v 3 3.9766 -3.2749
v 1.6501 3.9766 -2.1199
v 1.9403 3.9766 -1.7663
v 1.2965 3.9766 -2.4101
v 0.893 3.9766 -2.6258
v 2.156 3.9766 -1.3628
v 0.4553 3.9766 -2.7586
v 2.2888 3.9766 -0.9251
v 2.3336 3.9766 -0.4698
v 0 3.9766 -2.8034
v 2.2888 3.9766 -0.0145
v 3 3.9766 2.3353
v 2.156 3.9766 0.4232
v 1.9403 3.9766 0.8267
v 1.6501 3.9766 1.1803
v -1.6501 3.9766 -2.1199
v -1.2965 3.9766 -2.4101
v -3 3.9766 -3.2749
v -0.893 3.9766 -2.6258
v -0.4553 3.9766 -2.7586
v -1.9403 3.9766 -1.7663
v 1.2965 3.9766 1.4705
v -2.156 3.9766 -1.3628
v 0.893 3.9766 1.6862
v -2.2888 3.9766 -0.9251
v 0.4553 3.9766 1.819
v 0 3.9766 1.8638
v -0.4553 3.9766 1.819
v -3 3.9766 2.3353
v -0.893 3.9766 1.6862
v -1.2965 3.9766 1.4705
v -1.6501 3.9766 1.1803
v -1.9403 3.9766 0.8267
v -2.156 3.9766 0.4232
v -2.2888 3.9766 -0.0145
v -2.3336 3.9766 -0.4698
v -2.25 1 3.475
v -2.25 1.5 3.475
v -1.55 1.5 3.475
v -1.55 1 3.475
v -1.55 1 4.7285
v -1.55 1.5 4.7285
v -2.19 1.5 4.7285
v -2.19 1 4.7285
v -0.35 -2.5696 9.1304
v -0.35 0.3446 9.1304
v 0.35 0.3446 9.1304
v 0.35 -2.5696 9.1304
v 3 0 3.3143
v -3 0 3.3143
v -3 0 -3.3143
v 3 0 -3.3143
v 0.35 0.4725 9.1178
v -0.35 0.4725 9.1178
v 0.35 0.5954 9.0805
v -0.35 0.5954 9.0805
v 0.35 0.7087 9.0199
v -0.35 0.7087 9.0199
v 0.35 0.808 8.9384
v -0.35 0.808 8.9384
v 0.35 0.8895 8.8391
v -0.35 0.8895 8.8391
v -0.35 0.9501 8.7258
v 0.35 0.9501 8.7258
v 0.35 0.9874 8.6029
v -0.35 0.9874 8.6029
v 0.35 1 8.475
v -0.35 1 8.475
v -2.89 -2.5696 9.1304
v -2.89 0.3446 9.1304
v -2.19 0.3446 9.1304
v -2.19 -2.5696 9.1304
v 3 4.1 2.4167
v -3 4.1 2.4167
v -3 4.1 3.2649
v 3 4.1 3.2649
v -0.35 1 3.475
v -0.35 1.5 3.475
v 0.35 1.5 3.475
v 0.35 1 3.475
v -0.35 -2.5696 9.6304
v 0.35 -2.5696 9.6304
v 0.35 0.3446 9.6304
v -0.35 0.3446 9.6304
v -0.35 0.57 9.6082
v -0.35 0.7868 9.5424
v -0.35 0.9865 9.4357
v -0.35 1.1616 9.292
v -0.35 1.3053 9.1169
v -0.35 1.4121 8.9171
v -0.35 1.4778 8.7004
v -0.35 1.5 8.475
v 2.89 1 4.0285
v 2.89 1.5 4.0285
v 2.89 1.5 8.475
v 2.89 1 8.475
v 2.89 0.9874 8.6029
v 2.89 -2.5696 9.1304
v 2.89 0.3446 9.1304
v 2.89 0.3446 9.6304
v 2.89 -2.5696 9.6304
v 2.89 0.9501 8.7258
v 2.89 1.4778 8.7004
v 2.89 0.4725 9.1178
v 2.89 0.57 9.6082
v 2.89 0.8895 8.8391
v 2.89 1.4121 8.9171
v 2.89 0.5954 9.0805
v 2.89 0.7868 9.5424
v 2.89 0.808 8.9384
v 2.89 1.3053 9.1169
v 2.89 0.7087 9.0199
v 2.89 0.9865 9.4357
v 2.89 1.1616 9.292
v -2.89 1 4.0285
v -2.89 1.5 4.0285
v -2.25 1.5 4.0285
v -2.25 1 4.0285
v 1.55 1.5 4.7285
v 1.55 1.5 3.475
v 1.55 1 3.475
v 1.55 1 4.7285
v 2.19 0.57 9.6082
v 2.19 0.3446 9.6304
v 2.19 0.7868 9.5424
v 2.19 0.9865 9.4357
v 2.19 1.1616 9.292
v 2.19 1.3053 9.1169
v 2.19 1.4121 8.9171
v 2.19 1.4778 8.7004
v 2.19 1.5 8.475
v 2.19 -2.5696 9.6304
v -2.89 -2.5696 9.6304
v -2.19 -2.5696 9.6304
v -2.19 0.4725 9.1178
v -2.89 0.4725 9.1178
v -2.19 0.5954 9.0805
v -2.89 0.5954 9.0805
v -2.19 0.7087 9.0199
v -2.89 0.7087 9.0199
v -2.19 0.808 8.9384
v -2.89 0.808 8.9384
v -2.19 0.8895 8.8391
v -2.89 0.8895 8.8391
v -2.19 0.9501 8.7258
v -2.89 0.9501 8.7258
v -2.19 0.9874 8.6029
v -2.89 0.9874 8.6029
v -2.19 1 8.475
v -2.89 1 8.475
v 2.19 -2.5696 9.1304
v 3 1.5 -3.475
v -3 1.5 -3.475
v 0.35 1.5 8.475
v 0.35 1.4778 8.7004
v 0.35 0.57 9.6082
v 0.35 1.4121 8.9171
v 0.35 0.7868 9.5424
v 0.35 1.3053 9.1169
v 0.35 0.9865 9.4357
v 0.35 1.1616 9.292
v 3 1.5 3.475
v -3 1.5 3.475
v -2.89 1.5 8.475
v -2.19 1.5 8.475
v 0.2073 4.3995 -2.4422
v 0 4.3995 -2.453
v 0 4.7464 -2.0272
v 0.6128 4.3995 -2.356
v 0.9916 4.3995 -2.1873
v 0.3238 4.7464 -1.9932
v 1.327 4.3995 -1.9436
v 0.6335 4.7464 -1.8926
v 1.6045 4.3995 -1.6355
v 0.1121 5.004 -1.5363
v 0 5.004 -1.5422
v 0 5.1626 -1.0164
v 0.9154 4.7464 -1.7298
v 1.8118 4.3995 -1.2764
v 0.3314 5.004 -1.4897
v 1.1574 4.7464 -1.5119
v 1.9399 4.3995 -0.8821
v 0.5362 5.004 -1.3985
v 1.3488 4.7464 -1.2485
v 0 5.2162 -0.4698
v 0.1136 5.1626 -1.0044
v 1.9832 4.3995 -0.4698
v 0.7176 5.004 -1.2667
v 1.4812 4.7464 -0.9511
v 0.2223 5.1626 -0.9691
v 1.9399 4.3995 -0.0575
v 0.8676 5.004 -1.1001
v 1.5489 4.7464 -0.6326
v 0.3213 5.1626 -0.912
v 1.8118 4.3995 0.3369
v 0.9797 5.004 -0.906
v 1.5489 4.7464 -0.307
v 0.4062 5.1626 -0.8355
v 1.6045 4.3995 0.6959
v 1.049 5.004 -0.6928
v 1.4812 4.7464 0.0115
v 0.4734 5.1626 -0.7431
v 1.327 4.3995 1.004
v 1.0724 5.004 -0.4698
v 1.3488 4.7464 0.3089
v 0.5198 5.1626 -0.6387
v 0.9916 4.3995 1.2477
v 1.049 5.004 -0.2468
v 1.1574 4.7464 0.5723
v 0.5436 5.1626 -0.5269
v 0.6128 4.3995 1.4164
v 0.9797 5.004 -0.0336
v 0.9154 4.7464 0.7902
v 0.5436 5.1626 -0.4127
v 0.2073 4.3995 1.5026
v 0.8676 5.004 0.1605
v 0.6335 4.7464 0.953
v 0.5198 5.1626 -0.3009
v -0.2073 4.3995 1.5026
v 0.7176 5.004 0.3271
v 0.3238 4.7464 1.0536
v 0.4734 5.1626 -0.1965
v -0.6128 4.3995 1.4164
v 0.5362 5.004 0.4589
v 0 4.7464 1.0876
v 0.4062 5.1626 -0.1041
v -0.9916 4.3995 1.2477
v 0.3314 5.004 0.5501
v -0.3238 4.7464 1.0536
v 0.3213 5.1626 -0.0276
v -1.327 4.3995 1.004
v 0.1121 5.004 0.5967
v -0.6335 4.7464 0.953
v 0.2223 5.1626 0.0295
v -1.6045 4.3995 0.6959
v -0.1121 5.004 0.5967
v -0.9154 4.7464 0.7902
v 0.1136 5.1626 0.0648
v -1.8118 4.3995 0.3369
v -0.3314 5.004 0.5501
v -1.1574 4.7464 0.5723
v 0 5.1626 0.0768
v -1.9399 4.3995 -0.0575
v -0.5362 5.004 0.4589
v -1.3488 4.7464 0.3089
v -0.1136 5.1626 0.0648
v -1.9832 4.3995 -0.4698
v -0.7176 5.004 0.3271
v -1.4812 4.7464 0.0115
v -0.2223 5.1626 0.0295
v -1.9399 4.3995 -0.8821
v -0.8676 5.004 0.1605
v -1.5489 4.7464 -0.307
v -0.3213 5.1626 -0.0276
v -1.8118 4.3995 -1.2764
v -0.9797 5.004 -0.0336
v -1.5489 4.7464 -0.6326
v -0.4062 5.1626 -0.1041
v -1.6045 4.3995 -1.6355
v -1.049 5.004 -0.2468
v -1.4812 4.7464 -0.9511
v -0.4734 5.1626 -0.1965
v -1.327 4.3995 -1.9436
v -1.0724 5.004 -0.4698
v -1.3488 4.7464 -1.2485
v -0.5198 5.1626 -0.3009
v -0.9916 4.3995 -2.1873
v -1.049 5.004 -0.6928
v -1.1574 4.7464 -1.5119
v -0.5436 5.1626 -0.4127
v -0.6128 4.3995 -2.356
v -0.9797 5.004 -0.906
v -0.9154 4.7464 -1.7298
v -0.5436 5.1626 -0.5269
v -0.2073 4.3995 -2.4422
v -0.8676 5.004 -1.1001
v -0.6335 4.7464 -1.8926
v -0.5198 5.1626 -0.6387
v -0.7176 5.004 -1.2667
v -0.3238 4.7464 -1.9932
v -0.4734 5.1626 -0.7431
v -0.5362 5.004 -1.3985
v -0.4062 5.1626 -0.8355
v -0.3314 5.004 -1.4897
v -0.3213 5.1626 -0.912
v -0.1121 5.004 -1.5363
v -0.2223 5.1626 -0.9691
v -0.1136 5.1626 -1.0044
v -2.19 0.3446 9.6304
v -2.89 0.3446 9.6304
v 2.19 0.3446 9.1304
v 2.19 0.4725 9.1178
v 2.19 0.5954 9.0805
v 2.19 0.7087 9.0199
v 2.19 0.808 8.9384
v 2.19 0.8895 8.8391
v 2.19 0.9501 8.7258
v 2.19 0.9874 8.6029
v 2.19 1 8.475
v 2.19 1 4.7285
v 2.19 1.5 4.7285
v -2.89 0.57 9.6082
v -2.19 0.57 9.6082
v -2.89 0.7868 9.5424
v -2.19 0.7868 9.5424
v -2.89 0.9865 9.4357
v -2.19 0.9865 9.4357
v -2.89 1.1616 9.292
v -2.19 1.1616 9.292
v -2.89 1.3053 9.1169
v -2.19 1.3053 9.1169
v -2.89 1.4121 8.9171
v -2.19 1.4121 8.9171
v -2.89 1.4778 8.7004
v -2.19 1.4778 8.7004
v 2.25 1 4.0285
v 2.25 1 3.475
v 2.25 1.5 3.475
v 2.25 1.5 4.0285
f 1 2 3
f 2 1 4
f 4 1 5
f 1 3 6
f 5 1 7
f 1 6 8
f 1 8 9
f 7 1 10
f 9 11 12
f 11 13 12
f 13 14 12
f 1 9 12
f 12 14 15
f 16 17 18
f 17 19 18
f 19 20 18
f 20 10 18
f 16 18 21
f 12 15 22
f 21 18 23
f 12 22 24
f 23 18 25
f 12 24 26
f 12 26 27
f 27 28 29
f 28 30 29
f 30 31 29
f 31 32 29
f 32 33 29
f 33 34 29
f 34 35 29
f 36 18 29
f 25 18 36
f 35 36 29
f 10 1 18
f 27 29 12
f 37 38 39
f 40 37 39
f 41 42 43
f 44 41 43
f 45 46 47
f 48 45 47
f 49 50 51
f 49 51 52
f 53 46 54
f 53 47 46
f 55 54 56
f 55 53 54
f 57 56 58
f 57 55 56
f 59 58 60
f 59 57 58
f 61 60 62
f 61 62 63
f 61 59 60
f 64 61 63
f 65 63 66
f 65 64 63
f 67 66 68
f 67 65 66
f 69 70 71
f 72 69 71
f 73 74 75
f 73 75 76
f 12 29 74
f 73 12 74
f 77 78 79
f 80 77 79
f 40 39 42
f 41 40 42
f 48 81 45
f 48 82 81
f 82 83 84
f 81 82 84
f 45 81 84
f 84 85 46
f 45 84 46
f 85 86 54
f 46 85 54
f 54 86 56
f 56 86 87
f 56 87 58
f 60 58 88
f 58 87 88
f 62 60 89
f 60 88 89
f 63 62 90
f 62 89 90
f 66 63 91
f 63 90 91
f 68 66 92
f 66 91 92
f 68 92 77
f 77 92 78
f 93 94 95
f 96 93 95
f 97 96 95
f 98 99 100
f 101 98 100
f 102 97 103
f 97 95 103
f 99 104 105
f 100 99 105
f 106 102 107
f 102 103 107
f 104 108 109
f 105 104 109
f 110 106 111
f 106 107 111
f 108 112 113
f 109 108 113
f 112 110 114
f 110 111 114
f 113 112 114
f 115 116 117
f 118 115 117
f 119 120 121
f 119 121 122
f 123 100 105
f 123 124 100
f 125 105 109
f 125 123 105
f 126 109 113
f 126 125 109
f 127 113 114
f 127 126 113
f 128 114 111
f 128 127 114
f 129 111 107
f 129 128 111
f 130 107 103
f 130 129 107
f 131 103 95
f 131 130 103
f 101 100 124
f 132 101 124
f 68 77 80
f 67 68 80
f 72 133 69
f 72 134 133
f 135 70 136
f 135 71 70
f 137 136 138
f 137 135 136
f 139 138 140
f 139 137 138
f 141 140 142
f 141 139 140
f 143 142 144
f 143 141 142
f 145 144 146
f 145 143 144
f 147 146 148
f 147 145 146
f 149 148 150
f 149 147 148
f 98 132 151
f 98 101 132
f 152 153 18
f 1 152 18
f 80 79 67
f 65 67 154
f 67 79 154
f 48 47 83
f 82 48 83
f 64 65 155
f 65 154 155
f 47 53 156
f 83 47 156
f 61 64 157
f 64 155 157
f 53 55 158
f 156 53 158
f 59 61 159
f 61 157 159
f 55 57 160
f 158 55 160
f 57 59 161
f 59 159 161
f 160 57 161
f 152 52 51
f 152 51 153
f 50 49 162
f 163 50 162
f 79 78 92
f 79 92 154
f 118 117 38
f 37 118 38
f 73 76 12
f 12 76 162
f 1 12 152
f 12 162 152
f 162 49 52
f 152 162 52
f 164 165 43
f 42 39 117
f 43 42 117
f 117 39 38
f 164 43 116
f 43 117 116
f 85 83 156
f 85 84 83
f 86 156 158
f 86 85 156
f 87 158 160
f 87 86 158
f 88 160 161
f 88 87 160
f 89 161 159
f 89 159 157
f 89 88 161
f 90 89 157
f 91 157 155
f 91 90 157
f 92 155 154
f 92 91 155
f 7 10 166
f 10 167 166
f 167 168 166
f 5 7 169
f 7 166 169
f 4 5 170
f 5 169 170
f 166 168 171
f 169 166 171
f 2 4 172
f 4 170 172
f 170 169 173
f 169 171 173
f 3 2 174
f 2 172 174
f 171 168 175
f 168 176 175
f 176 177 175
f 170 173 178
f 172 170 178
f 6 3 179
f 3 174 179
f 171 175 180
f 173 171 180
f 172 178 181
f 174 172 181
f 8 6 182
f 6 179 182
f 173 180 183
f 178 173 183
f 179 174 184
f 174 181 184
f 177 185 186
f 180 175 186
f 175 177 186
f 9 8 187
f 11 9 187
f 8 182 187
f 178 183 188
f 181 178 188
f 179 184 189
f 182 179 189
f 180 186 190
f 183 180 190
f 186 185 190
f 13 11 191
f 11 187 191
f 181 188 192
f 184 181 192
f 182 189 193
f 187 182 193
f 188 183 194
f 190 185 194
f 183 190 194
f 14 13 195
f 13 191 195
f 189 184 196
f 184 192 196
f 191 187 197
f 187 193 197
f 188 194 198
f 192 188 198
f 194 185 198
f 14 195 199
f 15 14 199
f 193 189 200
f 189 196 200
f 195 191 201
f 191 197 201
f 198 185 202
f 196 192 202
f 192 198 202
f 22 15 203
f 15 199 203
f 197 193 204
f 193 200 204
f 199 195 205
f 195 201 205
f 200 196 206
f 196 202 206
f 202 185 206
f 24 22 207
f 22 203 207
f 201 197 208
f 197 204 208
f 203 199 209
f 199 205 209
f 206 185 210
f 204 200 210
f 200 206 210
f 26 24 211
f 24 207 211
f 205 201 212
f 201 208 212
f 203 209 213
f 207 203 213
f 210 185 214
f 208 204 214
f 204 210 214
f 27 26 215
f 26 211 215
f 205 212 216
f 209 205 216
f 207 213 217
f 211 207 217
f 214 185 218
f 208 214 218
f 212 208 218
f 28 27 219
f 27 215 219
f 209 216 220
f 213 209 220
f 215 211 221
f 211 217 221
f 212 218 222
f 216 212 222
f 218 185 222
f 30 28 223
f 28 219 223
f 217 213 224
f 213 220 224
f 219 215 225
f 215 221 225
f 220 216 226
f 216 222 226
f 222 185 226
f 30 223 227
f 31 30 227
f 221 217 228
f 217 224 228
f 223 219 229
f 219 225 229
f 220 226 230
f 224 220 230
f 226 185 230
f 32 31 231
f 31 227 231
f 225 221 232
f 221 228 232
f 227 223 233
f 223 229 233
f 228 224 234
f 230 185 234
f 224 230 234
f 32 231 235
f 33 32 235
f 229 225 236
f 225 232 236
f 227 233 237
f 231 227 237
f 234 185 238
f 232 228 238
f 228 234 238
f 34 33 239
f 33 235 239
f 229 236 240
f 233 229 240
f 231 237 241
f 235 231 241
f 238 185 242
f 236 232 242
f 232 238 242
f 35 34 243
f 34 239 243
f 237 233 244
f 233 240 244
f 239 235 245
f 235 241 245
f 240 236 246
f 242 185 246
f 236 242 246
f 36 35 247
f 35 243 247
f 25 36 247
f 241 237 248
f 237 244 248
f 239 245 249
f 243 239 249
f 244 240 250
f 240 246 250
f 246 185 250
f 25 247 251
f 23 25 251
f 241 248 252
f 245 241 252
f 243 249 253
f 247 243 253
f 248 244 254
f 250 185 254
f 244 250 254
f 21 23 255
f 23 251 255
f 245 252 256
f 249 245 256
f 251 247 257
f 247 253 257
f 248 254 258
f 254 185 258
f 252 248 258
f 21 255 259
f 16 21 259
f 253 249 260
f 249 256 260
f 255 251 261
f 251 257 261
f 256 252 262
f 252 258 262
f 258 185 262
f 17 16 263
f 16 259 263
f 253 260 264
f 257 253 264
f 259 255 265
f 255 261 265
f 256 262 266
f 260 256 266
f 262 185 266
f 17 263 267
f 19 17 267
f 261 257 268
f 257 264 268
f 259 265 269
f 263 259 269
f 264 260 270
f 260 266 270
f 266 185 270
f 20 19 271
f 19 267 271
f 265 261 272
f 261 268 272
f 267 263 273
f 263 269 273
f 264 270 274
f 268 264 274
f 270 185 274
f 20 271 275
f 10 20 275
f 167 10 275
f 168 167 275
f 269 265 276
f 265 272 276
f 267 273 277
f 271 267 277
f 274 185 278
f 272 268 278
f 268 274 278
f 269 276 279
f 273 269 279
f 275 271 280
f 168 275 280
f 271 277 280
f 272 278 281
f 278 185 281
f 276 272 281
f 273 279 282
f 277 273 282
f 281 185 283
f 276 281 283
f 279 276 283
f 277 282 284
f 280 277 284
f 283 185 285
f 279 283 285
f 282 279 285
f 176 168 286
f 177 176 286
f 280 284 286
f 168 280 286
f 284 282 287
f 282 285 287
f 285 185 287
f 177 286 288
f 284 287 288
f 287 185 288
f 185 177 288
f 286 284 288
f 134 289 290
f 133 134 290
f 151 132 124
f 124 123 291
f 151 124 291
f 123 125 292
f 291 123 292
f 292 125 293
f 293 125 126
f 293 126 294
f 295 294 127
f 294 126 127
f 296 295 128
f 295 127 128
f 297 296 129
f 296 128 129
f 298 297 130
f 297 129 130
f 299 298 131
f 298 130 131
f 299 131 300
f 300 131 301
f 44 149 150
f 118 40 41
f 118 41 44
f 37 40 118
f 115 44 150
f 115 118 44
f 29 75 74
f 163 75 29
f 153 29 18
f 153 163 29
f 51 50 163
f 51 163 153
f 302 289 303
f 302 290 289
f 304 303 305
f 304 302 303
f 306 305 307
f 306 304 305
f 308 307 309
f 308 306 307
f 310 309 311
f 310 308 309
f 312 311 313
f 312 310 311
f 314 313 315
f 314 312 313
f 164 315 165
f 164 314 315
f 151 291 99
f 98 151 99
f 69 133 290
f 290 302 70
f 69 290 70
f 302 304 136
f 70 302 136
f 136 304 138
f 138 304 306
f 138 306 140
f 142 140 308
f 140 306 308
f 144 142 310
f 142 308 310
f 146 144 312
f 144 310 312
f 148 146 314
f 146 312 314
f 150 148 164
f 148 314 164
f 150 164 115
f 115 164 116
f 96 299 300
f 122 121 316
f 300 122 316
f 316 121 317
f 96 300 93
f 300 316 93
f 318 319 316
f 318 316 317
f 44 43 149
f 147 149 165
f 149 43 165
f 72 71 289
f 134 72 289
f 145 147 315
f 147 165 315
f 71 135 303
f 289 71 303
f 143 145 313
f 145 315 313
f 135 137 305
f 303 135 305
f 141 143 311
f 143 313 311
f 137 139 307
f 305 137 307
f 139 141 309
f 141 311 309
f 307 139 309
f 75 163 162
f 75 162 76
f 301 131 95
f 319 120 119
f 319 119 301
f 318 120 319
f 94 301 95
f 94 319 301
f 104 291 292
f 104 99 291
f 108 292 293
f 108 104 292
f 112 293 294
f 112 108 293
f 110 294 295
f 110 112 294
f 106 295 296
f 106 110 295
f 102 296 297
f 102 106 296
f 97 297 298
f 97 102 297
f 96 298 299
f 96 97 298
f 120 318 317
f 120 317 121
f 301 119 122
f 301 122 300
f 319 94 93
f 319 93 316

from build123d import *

# Parameters (mm, degrees)
SKETCH1_W             = 6
SKETCH1_H             = 6.95
BOSS_EXTRUDE1_DEPTH   = 4.1
CUT_EXTRUDE2_DEPTH    = 10
SKETCH6_W             = 0.7
SKETCH6_H             = 5
BOSS_EXTRUDE2_DEPTH   = 0.5
BOSS_EXTRUDE2_2_DEPTH = 0.5
BOSS_EXTRUDE2_3_DEPTH = 0.5
SKETCH8_W             = 0.7
SKETCH8_H             = 0.5
LPATTERN1_COUNT       = 2
LPATTERN1_PITCH       = 2.54
LPATTERN2_COUNT       = 2
LPATTERN2_PITCH       = 2.54


with BuildPart() as part:
    # Sketch1 → Boss-Extrude1 (new body)
    with BuildSketch(Plane(origin=(0, 0, 0), x_dir=(1, 0, 0), z_dir=(0, 1, 0))):
        Rectangle(SKETCH1_W, SKETCH1_H)
    extrude(amount=BOSS_EXTRUDE1_DEPTH)

    # Sketch2 → Cut-Extrude2 (cut)
    with BuildSketch(Plane.ZY.offset(3)):
        Polygon((-3.475, 1.5), (-3.274875222, 3.976607761), (2.335282133, 3.976607761), (2.548204916, 4.299426173), (-3.248789555, 4.299426173), (-4.086743732, 4.299426173), (-4.086743732, -0.611534783), (-3.248789555, -0.611534783), align=None)
        Polygon((3.248789555, -0.611534783), (3.475, 1.5), (3.248789555, 4.299426173), (4.086743732, 4.299426173), (4.086743732, -0.611534783), align=None)
    extrude(amount=-CUT_EXTRUDE2_DEPTH, mode=Mode.SUBTRACT)

    # Sketch5 → Revolve2 (revolve)
    with BuildSketch(Plane(origin=(0, 0, 0), x_dir=(0, 0, -1), z_dir=(1, 0, 0))):
        with BuildLine():
            Line((0.469796544, 5.21616514), (0.469796544, 3.976607761))
            Line((0.469796544, 3.976607761), (2.803412544, 3.976607761))
            ThreePointArc((2.803412544, 3.976607761), (1.790995444, 4.887045907), (0.469796544, 5.21616514))
        make_face()
    revolve(axis=Axis((0, 3.976607761, -0.469796544), (0, -1, 0)))


with BuildPart() as body_2:
    # Sketch6 → Boss-Extrude2 (new body)
    with BuildSketch(Plane(origin=(0, 1.5, 0), x_dir=(1, 0, 0), z_dir=(0, 1, 0))):
        with Locations((0, -5.975)):
            Rectangle(SKETCH6_W, SKETCH6_H)
    extrude(amount=-BOSS_EXTRUDE2_DEPTH)

    # Sweep1: sweep along a path in Sketch7
    with BuildLine(Plane(origin=(0, 0, 0), x_dir=(0, 0, -1), z_dir=(1, 0, 0))) as sweep1_path:
        Line((-9.380387544, -2.569590895), (-9.380387544, 0.344612456))
        ThreePointArc((-9.380387544, 0.344612456), (-9.115205672, 0.984818128), (-8.475, 1.25))
    # Sketch8 → Sweep1 (sweep)
    with BuildSketch(Plane.XY.offset(8.475)):
        with Locations((0, 1.25)):
            Rectangle(SKETCH8_W, SKETCH8_H)
    sweep1 = sweep(path=sweep1_path.line)


with BuildPart() as body_3:
    # Sketch6 → Boss-Extrude2 2 (new body)
    with BuildSketch(Plane(origin=(0, 1.5, 0), x_dir=(1, 0, 0), z_dir=(0, 1, 0))):
        Polygon((-1.55, -3.475), (-1.55, -4.72854454), (-2.19, -4.72854454), (-2.19, -8.475), (-2.89, -8.475), (-2.89, -4.02854454), (-2.25, -4.02854454), (-2.25, -3.475), align=None)
    extrude(amount=-BOSS_EXTRUDE2_2_DEPTH)

    # LPattern2: Sweep1 ×2
    with Locations(*[(-i * LPATTERN2_PITCH, 0, 0) for i in range(1, LPATTERN2_COUNT)]):
        add(sweep1)


with BuildPart() as body_4:
    # Sketch6 → Boss-Extrude2 3 (new body)
    with BuildSketch(Plane(origin=(0, 1.5, 0), x_dir=(1, 0, 0), z_dir=(0, 1, 0))):
        Polygon((2.89, -4.02854454), (2.25, -4.02854454), (2.25, -3.475), (1.55, -3.475), (1.55, -4.72854454), (2.19, -4.72854454), (2.19, -8.475), (2.89, -8.475), align=None)
    extrude(amount=-BOSS_EXTRUDE2_3_DEPTH)

    # LPattern1: Sweep1 ×2
    with Locations(*[(i * LPATTERN1_PITCH, 0, 0) for i in range(1, LPATTERN1_COUNT)]):
        add(sweep1)


solid = Compound([part.part, body_2.part, body_3.part, body_4.part])
